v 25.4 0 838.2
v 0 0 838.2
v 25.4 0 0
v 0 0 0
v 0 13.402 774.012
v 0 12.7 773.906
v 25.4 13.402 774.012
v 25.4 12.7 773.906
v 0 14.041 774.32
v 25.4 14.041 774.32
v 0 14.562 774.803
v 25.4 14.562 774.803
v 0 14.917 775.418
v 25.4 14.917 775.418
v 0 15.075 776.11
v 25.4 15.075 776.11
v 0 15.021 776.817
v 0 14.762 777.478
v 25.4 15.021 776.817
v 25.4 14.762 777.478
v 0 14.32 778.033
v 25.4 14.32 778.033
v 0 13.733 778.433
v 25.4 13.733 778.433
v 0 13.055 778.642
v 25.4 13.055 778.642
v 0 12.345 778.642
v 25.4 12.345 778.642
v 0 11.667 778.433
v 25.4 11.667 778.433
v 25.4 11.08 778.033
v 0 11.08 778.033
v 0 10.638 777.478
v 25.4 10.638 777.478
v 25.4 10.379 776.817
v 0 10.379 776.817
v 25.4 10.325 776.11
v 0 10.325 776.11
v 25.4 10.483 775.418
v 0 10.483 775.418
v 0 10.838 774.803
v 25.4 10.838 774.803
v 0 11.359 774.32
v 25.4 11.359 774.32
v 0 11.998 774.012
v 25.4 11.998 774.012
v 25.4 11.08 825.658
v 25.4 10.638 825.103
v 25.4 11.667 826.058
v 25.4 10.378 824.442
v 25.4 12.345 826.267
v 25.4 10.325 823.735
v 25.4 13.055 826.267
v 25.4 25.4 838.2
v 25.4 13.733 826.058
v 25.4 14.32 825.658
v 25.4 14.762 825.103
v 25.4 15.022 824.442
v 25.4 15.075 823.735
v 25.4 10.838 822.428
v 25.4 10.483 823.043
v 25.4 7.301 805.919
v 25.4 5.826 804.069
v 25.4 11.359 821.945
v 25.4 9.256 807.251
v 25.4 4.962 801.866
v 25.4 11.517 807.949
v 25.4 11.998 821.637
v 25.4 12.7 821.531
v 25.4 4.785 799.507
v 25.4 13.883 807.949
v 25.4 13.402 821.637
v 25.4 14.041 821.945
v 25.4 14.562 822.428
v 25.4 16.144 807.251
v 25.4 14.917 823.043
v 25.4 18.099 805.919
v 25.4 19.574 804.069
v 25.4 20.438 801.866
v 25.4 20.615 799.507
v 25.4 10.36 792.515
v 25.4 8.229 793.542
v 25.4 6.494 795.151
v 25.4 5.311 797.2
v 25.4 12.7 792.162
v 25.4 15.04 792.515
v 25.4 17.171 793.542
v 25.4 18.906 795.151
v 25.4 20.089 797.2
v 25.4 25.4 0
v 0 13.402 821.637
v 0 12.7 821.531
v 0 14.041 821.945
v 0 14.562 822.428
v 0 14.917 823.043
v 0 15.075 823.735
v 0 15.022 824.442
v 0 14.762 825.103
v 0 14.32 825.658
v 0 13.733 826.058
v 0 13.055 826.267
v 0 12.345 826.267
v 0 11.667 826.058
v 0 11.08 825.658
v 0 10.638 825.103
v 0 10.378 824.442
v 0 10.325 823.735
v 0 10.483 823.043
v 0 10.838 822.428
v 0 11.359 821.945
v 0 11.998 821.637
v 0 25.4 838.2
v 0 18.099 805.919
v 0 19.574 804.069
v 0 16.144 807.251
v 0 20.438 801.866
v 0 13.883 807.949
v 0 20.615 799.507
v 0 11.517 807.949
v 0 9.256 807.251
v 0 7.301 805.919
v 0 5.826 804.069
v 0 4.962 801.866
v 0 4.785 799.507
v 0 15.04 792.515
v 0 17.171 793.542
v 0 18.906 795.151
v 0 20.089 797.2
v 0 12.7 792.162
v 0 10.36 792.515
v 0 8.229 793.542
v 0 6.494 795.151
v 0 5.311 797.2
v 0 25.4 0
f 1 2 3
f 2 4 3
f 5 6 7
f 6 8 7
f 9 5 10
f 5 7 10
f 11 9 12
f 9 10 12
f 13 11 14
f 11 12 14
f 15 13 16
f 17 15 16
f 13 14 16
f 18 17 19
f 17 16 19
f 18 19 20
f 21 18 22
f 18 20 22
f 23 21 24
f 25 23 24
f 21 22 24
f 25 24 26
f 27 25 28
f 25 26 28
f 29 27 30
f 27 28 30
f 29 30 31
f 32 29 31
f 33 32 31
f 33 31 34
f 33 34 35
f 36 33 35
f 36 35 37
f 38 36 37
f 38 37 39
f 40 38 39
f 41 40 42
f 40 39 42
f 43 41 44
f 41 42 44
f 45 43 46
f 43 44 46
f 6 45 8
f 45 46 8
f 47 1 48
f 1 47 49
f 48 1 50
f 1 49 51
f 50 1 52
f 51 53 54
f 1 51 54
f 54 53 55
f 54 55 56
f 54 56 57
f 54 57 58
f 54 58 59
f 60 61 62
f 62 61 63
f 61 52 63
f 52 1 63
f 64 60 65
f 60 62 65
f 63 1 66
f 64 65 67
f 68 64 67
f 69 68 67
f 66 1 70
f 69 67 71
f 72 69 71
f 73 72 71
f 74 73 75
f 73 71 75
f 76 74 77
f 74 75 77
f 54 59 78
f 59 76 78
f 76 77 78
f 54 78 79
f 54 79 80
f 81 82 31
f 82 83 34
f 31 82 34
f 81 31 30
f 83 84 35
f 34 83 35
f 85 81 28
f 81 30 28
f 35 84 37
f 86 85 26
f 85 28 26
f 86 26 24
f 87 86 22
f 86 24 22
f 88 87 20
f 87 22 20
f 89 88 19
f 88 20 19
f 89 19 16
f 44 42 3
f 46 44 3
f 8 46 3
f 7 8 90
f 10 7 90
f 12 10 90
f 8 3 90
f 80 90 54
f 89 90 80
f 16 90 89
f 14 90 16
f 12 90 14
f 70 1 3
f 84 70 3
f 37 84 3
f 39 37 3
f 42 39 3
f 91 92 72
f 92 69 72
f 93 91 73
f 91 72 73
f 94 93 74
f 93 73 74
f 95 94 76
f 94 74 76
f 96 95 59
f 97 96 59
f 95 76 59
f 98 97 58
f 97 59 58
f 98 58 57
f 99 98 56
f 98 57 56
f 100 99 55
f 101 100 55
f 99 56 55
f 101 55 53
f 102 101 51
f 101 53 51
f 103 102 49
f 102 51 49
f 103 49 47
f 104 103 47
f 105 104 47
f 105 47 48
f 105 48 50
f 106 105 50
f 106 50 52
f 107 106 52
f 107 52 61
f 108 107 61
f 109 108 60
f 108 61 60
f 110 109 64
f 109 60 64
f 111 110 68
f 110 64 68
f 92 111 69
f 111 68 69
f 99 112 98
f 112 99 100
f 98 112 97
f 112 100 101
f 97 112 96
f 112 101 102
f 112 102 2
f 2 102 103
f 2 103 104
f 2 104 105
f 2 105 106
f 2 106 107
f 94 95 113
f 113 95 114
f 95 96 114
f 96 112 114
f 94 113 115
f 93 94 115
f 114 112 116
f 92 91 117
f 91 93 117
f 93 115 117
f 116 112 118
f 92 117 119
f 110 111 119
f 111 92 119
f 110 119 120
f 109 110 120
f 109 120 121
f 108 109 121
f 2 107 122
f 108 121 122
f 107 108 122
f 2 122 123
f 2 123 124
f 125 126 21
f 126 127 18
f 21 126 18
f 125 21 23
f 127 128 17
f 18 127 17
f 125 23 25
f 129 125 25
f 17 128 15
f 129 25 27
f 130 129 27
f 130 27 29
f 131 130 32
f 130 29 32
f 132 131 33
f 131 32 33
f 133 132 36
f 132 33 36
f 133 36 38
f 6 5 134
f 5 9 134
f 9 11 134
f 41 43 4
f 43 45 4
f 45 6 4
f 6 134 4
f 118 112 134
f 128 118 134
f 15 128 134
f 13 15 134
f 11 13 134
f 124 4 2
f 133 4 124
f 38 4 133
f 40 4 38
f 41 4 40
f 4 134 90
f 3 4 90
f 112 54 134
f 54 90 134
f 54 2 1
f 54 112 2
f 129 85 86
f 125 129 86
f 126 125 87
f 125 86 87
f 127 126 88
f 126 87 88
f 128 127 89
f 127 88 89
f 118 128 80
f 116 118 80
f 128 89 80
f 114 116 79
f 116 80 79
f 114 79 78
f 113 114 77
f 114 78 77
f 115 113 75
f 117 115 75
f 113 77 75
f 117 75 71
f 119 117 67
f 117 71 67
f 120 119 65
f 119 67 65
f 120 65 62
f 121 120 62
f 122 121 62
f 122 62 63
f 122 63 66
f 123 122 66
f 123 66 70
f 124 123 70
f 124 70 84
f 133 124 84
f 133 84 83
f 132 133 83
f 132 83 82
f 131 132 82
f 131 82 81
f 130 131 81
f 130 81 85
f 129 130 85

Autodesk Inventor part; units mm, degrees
ref_plane "YZ Plane" through (0, 0, 0) normal (1, 0, 0) x (0, 1, 0)
ref_plane "XZ Plane" through (0, 0, 0) normal (0, 1, 0) x (-1, 0, 0)
ref_plane "XY Plane" through (0, 0, 0) normal (0, 0, 1) x (1, 0, 0)
sketch "Sketch1" plane through (0, 0, 0) normal (0, 0, 1) x (1, 0, 0)
  line L0 (0, 0) -> (25.4, 0)
  line L1 (25.4, 0) -> (25.4, 25.4)
  line L2 (25.4, 25.4) -> (0, 25.4)
  line L3 (0, 25.4) -> (0, 0)
  dimension "d0" = 25.4
  dimension "d1" = 25.4
extrude "Extrusion1" add sketch "Sketch1" along normal blind 838.2
sketch "Sketch2" plane through (25.4, 0, 0) normal (1, 0, 0) x (0, 0, -1)
  line L0 (-838.2, 0) -> (-838.2, 25.4) projected
  circle A0 centre (-800.1, 12.7) radius 7.9375
  circle A1 centre (-823.9125, 12.7) radius 2.3813
  circle A2 centre (-776.2875, 12.7) radius 2.3812
  dimension "d4" = 15.875
  dimension "d5" = 38.1
  dimension "d8" = 4.7625
  dimension "d9" = 4.7625
  dimension "d10" = 23.8125
  dimension "d11" = 23.8125
extrude "Extrusion3" cut sketch "Sketch2" against normal blind 25.4
equation "\"d11\" = d10"
properties part number "utilityarm1x1"
